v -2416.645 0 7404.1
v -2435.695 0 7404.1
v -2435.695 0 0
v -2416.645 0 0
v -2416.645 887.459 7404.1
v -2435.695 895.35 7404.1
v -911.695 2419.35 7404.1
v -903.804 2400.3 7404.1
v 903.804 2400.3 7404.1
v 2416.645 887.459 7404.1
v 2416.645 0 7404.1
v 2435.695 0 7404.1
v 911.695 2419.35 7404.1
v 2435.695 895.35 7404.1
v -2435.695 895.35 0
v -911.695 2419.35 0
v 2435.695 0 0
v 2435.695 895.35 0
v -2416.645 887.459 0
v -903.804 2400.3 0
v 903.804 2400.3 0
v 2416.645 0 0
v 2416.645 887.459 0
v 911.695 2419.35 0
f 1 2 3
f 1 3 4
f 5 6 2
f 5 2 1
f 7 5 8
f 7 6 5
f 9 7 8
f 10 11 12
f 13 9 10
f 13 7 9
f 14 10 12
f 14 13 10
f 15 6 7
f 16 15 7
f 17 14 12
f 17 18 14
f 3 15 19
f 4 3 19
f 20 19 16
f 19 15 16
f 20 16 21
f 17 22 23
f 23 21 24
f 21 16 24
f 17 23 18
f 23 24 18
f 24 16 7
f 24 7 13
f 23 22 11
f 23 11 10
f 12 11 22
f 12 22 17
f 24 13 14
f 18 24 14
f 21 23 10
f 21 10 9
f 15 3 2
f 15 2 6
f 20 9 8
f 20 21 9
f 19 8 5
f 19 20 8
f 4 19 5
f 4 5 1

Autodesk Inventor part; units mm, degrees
ref_plane "YZ Plane" through (0, 0, 0) normal (1, 0, 0) x (0, 1, 0)
ref_plane "XZ Plane" through (0, 0, 0) normal (0, 1, 0) x (-1, 0, 0)
ref_plane "XY Plane" through (0, 0, 0) normal (0, 0, 1) x (1, 0, 0)
sketch "Sketch1" plane through (0, 0, 0) normal (0, 0, 1) x (1, 0, 0)
  line L0 (-2435.6949, 0) -> (-2435.6949, 895.3501)
  line L1 (-2435.6949, 895.3501) -> (-911.6949, 2419.3501)
  line L2 (-911.6949, 2419.3501) -> (911.6949, 2419.3501)
  line L3 (911.6949, 2419.3501) -> (2435.6949, 895.3501)
  line L4 (2435.6949, 895.3501) -> (2435.6949, 0)
  line L5 (903.8041, 2400.3001) -> (-903.8041, 2400.3001)
  line L6 (-903.8041, 2400.3001) -> (-2416.6449, 887.4594)
  line L7 (-2416.6449, 887.4594) -> (-2416.6449, 0)
  line L8 (2416.6449, 0) -> (2416.6449, 887.4594)
  line L9 (2416.6449, 887.4594) -> (903.8041, 2400.3001)
  line L10 (2416.6449, 0) -> (2435.6949, 0)
  line L11 (-2435.6949, 0) -> (-2416.6449, 0)
  line L12 (2435.6949, 0) -> (-2435.6949, 0)
  point P0 (0, 0)
  point P1 (0, 0)
  point P2 (0, 0)
  dimension "d2" = 4871.3898
  dimension "d3" = 135
  dimension "d4" = 1823.3898
  dimension "d5" = 19.05
  dimension "d8" = 895.3501
  dimension "d9" = 135
  dimension "d10" = 19.05
  dimension "d11" = 19.05
  dimension "d12" = 19.05
  dimension "d13" = 135
extrude "Extrusion1" add sketch "Sketch1" along normal blind 7404.1 contours L0 L1 L2 L3 L4 L10 L8 L9 L5 L6 L7 L11
properties part number "Drywall" material "Concrete"
